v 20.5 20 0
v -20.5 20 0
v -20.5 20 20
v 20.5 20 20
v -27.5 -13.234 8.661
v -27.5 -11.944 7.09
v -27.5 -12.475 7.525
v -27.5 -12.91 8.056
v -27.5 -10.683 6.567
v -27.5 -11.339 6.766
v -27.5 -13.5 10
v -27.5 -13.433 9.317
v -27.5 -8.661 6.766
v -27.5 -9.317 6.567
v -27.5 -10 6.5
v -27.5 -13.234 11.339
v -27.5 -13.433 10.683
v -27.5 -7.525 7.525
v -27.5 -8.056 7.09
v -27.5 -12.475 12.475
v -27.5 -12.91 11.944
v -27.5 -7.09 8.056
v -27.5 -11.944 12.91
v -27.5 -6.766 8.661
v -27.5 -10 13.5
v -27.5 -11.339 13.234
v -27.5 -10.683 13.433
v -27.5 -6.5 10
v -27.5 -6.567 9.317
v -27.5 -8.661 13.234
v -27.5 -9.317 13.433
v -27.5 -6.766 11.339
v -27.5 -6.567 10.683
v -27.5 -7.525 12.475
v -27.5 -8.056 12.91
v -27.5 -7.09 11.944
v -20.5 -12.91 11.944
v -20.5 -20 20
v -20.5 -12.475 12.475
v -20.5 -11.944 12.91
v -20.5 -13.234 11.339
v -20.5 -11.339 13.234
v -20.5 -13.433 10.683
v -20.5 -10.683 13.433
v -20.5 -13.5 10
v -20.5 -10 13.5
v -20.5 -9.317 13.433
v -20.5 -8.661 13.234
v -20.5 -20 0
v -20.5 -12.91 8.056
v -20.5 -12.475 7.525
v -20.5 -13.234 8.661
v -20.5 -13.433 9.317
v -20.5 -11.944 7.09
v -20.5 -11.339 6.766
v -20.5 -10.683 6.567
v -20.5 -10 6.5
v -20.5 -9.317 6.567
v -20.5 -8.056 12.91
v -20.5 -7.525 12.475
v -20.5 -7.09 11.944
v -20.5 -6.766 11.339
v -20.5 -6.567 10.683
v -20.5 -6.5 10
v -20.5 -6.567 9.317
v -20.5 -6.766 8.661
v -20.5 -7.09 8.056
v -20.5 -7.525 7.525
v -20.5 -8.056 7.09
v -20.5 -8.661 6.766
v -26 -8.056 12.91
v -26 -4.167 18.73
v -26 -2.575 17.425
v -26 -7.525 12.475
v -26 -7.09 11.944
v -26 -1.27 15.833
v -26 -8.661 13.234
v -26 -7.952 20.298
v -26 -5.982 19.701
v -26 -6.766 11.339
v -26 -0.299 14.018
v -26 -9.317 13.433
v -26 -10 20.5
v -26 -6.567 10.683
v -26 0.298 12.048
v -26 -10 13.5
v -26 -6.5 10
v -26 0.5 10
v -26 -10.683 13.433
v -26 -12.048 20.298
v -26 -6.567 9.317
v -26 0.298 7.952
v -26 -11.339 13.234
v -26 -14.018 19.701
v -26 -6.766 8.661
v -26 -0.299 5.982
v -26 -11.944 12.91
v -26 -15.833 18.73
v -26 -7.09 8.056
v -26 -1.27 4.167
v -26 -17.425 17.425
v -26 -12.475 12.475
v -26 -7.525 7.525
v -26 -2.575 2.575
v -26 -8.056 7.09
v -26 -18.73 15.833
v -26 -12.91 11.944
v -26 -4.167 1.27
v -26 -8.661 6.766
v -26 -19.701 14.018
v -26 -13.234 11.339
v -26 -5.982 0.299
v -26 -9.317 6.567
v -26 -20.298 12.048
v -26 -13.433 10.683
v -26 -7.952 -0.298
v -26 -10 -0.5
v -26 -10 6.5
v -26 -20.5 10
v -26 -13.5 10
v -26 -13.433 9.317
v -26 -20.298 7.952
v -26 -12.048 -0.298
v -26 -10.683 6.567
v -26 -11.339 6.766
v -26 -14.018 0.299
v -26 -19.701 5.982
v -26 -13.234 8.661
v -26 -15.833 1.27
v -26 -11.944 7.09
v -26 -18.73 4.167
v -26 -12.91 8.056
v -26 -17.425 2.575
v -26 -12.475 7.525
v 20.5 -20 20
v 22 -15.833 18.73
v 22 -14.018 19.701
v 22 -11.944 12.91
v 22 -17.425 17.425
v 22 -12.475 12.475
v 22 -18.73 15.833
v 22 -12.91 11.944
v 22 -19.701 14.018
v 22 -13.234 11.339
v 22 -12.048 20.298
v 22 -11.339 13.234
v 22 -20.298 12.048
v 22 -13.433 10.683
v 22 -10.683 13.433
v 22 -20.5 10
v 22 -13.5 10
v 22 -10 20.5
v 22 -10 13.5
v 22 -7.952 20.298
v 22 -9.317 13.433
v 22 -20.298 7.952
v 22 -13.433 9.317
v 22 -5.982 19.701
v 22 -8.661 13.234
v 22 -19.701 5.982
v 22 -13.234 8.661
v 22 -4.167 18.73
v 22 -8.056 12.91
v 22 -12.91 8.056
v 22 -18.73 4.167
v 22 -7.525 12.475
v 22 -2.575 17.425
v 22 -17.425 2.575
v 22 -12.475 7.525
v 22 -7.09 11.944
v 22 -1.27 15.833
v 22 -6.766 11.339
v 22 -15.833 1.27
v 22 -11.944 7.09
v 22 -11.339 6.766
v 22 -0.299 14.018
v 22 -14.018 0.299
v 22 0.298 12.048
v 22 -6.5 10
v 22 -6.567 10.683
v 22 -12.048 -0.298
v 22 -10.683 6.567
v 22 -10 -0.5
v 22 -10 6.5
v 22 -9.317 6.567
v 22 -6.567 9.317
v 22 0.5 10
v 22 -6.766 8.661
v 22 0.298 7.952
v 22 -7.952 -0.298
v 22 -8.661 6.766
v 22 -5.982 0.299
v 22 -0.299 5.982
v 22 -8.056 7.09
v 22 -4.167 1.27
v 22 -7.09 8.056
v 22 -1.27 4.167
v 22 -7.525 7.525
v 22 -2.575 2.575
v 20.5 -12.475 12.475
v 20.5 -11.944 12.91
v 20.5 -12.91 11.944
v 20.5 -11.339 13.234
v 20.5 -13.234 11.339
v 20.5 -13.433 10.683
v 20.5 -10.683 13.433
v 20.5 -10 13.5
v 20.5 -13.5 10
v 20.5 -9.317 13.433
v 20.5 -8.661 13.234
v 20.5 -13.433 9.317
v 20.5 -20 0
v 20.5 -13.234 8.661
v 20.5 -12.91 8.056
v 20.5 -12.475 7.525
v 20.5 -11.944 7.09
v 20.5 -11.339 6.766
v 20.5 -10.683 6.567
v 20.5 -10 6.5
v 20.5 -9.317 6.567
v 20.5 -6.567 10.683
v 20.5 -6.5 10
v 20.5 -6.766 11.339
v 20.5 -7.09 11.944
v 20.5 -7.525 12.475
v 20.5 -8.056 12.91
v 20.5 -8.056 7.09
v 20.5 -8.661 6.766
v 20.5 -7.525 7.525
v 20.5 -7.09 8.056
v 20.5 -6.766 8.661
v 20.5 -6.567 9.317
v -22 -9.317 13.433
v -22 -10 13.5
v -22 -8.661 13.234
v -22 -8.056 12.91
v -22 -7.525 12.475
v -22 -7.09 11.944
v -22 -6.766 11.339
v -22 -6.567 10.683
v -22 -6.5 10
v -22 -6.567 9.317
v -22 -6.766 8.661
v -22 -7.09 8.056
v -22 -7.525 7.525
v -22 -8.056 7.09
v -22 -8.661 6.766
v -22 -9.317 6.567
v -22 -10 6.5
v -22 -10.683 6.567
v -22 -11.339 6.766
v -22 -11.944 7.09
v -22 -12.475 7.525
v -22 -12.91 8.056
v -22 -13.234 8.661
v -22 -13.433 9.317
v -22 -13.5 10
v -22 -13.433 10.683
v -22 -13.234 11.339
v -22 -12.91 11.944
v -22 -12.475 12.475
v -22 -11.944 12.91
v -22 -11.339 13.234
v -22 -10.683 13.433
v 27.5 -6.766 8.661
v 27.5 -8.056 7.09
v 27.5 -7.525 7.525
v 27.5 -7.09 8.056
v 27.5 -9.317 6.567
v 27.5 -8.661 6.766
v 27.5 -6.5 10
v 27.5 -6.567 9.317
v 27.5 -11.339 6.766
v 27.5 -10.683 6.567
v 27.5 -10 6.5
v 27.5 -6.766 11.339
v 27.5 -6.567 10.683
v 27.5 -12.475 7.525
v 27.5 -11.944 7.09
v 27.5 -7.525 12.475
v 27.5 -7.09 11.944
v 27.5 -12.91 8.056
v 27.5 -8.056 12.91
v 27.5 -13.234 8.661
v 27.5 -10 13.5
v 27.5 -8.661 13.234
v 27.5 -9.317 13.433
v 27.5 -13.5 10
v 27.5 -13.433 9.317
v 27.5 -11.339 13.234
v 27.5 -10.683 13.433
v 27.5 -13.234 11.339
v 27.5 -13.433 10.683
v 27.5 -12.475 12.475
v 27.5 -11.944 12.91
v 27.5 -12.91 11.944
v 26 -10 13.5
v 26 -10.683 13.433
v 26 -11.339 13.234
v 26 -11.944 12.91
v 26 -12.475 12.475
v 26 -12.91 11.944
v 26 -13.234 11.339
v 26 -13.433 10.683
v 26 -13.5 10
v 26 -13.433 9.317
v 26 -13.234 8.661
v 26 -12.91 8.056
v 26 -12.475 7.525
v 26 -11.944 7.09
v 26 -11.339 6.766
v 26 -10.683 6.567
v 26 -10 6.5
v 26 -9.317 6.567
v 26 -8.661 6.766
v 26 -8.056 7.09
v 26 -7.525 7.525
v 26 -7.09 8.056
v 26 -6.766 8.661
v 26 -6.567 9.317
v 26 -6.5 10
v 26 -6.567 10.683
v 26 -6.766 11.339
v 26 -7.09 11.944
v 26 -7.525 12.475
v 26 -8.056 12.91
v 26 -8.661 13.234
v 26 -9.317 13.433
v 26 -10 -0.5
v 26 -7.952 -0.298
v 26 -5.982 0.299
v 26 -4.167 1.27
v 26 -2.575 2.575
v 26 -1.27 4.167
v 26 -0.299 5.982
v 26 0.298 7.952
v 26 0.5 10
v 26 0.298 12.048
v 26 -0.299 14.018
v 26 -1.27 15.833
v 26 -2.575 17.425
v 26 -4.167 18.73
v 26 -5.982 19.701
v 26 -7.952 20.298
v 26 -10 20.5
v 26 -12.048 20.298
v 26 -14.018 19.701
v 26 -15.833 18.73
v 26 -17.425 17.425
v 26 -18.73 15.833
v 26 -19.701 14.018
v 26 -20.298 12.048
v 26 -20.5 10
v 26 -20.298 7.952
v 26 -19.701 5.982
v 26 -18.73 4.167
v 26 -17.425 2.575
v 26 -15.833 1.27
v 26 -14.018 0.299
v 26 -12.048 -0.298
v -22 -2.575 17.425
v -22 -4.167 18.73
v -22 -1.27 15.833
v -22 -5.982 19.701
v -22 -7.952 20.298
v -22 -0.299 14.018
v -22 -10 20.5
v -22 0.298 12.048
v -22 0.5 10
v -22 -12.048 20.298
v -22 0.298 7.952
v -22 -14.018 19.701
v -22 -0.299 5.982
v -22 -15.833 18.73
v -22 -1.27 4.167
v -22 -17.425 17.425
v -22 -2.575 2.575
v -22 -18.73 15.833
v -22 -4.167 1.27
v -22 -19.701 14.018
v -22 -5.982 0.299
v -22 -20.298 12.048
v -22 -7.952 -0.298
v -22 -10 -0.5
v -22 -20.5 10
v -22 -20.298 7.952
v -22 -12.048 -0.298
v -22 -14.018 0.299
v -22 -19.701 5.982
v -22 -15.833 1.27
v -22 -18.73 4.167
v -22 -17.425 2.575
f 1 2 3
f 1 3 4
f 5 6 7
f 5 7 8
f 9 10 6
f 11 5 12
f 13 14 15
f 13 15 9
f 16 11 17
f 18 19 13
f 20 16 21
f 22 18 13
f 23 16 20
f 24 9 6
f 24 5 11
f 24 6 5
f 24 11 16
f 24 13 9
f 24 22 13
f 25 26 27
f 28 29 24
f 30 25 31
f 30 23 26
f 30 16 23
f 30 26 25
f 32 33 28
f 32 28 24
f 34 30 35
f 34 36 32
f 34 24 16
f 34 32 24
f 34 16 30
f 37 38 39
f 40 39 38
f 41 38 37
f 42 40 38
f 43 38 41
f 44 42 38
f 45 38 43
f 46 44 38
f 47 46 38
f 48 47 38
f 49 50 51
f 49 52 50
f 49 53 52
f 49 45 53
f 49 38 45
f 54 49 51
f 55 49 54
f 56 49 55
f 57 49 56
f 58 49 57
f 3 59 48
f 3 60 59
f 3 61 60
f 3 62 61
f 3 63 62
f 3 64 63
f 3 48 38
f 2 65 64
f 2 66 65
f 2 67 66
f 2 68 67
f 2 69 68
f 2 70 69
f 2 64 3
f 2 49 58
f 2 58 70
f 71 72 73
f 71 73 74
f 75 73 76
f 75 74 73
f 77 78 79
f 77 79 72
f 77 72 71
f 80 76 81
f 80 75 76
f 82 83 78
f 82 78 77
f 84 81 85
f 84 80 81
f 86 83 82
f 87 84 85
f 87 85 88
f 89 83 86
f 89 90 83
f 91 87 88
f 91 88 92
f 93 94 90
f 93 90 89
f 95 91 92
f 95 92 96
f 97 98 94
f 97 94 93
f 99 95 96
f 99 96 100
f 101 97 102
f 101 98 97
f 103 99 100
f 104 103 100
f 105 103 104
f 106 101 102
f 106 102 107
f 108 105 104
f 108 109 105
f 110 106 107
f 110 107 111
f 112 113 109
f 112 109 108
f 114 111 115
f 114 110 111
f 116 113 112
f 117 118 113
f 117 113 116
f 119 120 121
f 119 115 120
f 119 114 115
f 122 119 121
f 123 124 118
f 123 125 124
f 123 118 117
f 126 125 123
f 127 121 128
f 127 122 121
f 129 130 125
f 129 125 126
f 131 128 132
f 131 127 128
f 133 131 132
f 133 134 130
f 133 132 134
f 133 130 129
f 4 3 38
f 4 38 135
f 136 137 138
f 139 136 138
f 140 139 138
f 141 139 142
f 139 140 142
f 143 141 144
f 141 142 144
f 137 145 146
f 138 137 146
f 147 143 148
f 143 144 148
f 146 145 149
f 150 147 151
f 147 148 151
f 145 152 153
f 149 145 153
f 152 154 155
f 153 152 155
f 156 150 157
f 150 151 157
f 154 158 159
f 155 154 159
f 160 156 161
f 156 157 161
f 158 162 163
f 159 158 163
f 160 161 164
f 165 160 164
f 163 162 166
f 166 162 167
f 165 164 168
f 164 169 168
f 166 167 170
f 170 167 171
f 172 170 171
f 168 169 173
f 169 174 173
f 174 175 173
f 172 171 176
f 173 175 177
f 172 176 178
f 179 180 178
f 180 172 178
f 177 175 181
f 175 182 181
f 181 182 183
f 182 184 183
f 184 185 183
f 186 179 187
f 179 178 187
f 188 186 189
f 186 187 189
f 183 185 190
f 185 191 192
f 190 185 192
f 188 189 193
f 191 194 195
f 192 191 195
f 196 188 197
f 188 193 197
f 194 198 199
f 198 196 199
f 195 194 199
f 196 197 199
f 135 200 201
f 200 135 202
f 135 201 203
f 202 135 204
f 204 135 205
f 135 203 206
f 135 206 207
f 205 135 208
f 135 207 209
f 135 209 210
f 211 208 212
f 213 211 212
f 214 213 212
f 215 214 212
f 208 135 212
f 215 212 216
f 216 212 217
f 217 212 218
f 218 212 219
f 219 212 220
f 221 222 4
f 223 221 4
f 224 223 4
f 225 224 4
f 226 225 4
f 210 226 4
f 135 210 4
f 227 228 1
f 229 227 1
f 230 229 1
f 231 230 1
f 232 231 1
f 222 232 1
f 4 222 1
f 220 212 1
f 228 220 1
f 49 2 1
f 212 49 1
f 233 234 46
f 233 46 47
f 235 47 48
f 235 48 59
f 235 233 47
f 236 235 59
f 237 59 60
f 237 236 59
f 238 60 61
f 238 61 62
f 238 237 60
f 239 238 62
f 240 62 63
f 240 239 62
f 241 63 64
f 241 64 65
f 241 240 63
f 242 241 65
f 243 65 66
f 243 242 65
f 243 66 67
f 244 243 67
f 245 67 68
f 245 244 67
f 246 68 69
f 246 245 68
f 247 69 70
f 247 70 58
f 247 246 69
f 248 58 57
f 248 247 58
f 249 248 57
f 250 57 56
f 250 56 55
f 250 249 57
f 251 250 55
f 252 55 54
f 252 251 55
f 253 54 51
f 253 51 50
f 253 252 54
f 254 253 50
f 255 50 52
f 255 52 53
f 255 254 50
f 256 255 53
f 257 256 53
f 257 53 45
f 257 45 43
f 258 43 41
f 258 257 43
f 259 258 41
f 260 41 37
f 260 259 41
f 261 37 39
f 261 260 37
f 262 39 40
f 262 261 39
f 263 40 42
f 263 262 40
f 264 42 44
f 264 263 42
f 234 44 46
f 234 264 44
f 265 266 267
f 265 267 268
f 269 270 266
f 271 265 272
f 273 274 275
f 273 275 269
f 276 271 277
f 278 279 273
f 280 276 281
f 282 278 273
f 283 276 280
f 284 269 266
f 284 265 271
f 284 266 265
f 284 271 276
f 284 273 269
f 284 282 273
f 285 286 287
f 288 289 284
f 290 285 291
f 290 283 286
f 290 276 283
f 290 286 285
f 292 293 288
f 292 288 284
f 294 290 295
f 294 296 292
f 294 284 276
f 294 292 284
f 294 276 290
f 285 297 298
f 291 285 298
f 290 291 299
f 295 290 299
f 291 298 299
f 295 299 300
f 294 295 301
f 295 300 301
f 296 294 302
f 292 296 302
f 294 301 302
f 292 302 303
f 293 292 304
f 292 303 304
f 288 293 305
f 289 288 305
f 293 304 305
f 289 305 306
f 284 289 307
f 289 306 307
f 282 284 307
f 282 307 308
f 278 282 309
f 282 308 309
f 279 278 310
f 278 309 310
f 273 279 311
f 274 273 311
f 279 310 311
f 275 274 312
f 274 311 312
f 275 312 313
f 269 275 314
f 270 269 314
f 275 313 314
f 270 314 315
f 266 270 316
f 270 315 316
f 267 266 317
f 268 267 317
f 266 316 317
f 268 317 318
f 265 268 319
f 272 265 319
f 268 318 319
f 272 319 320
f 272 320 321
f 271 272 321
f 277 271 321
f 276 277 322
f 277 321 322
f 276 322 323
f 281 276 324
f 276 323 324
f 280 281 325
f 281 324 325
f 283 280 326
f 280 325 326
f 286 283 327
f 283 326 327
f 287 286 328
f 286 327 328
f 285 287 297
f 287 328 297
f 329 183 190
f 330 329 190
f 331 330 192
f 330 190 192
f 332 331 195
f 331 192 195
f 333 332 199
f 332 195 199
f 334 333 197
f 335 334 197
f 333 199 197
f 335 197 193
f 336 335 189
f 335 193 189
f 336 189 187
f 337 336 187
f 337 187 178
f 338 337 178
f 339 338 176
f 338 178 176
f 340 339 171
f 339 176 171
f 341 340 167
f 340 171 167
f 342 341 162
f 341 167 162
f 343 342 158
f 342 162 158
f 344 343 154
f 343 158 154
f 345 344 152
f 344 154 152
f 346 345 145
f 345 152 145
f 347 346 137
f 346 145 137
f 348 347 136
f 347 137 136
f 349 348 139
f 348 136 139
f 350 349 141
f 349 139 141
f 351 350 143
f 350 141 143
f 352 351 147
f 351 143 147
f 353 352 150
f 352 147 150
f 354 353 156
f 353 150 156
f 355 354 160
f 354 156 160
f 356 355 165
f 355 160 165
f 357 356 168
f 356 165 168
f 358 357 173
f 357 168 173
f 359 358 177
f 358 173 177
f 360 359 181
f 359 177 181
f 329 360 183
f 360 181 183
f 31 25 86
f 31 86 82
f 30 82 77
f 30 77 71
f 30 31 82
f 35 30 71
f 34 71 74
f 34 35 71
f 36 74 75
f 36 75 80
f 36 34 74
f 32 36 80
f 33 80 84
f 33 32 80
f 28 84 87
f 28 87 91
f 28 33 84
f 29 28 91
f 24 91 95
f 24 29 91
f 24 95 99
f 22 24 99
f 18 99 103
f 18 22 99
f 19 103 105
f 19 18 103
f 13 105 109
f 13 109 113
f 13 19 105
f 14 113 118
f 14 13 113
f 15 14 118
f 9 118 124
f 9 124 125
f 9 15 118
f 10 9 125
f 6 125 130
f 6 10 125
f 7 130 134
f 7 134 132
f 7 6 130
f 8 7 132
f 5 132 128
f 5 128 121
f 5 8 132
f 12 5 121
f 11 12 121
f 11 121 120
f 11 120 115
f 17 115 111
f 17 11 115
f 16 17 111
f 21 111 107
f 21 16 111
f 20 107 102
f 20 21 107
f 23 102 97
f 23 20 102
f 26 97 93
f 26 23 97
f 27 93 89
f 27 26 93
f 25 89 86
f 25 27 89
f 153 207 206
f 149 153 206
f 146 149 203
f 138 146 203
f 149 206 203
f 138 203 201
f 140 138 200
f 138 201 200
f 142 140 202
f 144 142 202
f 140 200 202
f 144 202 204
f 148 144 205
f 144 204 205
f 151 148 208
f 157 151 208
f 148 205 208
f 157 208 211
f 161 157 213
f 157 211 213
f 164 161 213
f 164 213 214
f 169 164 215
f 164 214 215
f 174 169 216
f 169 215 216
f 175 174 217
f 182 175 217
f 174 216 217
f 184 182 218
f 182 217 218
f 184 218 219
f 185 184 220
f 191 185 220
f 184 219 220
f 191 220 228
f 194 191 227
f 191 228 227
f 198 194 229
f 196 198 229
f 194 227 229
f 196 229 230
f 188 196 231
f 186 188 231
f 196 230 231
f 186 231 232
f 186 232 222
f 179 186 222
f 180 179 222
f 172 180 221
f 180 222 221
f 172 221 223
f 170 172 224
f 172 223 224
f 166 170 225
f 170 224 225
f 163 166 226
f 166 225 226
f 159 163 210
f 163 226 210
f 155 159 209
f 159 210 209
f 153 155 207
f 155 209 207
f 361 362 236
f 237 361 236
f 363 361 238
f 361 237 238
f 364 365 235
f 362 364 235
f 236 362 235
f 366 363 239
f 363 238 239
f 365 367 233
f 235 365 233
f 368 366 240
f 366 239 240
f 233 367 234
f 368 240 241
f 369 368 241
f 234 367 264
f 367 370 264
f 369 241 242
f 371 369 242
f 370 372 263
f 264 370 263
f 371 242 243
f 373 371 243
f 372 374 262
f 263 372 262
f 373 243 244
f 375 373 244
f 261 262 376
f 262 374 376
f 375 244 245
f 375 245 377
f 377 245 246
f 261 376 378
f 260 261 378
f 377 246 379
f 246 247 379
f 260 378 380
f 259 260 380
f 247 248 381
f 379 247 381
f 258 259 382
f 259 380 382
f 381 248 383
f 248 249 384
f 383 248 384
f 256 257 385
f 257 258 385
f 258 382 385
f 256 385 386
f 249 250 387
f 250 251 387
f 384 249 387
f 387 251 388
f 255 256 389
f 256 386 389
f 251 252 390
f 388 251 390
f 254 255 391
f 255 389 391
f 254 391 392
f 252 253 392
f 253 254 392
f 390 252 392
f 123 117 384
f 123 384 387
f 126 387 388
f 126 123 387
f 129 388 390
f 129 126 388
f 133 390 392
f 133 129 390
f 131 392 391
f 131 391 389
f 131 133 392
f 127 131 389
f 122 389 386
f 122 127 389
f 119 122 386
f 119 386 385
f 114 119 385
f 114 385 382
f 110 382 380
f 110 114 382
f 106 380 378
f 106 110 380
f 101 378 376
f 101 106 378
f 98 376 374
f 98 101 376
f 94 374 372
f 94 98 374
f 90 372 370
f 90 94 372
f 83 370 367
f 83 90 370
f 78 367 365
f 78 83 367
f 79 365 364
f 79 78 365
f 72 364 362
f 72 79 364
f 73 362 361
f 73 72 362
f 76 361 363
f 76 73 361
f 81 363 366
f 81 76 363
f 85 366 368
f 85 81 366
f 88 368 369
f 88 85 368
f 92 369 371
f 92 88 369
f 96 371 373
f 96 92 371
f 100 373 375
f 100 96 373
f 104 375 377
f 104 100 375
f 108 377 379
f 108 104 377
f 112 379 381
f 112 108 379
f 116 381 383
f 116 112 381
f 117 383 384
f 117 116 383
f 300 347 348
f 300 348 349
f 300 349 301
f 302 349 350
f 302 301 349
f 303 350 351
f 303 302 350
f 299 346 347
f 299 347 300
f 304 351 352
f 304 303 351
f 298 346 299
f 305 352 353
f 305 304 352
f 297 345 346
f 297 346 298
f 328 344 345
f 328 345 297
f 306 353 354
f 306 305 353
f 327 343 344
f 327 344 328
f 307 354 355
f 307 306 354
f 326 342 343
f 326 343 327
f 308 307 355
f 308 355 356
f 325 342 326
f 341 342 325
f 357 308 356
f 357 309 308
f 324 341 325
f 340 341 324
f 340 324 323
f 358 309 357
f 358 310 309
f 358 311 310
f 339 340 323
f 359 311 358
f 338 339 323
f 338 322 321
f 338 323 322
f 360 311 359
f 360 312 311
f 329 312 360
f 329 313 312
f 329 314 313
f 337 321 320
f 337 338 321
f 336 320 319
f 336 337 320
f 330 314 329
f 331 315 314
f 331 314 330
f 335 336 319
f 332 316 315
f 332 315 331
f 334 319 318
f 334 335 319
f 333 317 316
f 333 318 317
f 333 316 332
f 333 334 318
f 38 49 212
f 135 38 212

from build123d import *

# Parameters (mm, degrees)
CROQUIS1_W              = 41
CROQUIS1_H              = 40
SALIENTE_EXTRUIR1_DEPTH = 20
CROQUIS2_R              = 3.5
SALIENTE_EXTRUIR2_DEPTH = 1.5
SALIENTE_EXTRUIR3_START = 1.5
CROQUIS3_R              = 3.5
SALIENTE_EXTRUIR3_DEPTH = 1.5
CROQUIS4_R              = 10.5
SALIENTE_EXTRUIR4_DEPTH = 4
SALIENTE_EXTRUIR5_START = 4
CROQUIS5_R              = 10.5
SALIENTE_EXTRUIR5_DEPTH = 4
SALIENTE_EXTRUIR8_START = 1.5
CROQUIS8_R              = 3.5
SALIENTE_EXTRUIR8_DEPTH = 1.5
CROQUIS9_R              = 3.5
SALIENTE_EXTRUIR9_DEPTH = 1.5


with BuildPart() as part:
    # Croquis1 → Saliente-Extruir1 (new body)
    with BuildSketch(Plane.XY):
        Rectangle(CROQUIS1_W, CROQUIS1_H)
    extrude(amount=SALIENTE_EXTRUIR1_DEPTH)

    # Croquis2 → Saliente-Extruir2 (add)
    with BuildSketch(Plane(origin=(20.5, 0, 0), x_dir=(0, 0, -1), z_dir=(1, 0, 0))):
        with Locations(Location((-10, -10, 0), (0, 0, 180))):
            Circle(CROQUIS2_R)
    extrude(amount=SALIENTE_EXTRUIR2_DEPTH)

    # Croquis3 → Saliente-Extruir3 (add)
    with BuildSketch(Plane.ZY.offset(20.5).offset(SALIENTE_EXTRUIR3_START)):
        with Locations((10, -10)):
            Circle(CROQUIS3_R)
    extrude(amount=-SALIENTE_EXTRUIR3_DEPTH)

    # Croquis4 → Saliente-Extruir4 (add)
    with BuildSketch(Plane(origin=(22, 0, 0), x_dir=(0, 0, -1), z_dir=(1, 0, 0))):
        with Locations((-10, -10)):
            Circle(CROQUIS4_R)
    extrude(amount=SALIENTE_EXTRUIR4_DEPTH)

    # Croquis5 → Saliente-Extruir5 (add)
    with BuildSketch(Plane.ZY.offset(22).offset(SALIENTE_EXTRUIR5_START)):
        with Locations(Location((10, -10, 0), (0, 0, 180))):
            Circle(CROQUIS5_R)
    extrude(amount=-SALIENTE_EXTRUIR5_DEPTH)

    # Croquis8 → Saliente-Extruir8 (add)
    with BuildSketch(Plane.ZY.offset(26).offset(SALIENTE_EXTRUIR8_START)):
        with Locations((10, -10)):
            Circle(CROQUIS8_R)
    extrude(amount=-SALIENTE_EXTRUIR8_DEPTH)

    # Croquis9 → Saliente-Extruir9 (add)
    with BuildSketch(Plane(origin=(26, 0, 0), x_dir=(0, 0, -1), z_dir=(1, 0, 0))):
        with Locations(Location((-10, -10, 0), (0, 0, 180))):
            Circle(CROQUIS9_R)
    extrude(amount=SALIENTE_EXTRUIR9_DEPTH)


solid = part.part
